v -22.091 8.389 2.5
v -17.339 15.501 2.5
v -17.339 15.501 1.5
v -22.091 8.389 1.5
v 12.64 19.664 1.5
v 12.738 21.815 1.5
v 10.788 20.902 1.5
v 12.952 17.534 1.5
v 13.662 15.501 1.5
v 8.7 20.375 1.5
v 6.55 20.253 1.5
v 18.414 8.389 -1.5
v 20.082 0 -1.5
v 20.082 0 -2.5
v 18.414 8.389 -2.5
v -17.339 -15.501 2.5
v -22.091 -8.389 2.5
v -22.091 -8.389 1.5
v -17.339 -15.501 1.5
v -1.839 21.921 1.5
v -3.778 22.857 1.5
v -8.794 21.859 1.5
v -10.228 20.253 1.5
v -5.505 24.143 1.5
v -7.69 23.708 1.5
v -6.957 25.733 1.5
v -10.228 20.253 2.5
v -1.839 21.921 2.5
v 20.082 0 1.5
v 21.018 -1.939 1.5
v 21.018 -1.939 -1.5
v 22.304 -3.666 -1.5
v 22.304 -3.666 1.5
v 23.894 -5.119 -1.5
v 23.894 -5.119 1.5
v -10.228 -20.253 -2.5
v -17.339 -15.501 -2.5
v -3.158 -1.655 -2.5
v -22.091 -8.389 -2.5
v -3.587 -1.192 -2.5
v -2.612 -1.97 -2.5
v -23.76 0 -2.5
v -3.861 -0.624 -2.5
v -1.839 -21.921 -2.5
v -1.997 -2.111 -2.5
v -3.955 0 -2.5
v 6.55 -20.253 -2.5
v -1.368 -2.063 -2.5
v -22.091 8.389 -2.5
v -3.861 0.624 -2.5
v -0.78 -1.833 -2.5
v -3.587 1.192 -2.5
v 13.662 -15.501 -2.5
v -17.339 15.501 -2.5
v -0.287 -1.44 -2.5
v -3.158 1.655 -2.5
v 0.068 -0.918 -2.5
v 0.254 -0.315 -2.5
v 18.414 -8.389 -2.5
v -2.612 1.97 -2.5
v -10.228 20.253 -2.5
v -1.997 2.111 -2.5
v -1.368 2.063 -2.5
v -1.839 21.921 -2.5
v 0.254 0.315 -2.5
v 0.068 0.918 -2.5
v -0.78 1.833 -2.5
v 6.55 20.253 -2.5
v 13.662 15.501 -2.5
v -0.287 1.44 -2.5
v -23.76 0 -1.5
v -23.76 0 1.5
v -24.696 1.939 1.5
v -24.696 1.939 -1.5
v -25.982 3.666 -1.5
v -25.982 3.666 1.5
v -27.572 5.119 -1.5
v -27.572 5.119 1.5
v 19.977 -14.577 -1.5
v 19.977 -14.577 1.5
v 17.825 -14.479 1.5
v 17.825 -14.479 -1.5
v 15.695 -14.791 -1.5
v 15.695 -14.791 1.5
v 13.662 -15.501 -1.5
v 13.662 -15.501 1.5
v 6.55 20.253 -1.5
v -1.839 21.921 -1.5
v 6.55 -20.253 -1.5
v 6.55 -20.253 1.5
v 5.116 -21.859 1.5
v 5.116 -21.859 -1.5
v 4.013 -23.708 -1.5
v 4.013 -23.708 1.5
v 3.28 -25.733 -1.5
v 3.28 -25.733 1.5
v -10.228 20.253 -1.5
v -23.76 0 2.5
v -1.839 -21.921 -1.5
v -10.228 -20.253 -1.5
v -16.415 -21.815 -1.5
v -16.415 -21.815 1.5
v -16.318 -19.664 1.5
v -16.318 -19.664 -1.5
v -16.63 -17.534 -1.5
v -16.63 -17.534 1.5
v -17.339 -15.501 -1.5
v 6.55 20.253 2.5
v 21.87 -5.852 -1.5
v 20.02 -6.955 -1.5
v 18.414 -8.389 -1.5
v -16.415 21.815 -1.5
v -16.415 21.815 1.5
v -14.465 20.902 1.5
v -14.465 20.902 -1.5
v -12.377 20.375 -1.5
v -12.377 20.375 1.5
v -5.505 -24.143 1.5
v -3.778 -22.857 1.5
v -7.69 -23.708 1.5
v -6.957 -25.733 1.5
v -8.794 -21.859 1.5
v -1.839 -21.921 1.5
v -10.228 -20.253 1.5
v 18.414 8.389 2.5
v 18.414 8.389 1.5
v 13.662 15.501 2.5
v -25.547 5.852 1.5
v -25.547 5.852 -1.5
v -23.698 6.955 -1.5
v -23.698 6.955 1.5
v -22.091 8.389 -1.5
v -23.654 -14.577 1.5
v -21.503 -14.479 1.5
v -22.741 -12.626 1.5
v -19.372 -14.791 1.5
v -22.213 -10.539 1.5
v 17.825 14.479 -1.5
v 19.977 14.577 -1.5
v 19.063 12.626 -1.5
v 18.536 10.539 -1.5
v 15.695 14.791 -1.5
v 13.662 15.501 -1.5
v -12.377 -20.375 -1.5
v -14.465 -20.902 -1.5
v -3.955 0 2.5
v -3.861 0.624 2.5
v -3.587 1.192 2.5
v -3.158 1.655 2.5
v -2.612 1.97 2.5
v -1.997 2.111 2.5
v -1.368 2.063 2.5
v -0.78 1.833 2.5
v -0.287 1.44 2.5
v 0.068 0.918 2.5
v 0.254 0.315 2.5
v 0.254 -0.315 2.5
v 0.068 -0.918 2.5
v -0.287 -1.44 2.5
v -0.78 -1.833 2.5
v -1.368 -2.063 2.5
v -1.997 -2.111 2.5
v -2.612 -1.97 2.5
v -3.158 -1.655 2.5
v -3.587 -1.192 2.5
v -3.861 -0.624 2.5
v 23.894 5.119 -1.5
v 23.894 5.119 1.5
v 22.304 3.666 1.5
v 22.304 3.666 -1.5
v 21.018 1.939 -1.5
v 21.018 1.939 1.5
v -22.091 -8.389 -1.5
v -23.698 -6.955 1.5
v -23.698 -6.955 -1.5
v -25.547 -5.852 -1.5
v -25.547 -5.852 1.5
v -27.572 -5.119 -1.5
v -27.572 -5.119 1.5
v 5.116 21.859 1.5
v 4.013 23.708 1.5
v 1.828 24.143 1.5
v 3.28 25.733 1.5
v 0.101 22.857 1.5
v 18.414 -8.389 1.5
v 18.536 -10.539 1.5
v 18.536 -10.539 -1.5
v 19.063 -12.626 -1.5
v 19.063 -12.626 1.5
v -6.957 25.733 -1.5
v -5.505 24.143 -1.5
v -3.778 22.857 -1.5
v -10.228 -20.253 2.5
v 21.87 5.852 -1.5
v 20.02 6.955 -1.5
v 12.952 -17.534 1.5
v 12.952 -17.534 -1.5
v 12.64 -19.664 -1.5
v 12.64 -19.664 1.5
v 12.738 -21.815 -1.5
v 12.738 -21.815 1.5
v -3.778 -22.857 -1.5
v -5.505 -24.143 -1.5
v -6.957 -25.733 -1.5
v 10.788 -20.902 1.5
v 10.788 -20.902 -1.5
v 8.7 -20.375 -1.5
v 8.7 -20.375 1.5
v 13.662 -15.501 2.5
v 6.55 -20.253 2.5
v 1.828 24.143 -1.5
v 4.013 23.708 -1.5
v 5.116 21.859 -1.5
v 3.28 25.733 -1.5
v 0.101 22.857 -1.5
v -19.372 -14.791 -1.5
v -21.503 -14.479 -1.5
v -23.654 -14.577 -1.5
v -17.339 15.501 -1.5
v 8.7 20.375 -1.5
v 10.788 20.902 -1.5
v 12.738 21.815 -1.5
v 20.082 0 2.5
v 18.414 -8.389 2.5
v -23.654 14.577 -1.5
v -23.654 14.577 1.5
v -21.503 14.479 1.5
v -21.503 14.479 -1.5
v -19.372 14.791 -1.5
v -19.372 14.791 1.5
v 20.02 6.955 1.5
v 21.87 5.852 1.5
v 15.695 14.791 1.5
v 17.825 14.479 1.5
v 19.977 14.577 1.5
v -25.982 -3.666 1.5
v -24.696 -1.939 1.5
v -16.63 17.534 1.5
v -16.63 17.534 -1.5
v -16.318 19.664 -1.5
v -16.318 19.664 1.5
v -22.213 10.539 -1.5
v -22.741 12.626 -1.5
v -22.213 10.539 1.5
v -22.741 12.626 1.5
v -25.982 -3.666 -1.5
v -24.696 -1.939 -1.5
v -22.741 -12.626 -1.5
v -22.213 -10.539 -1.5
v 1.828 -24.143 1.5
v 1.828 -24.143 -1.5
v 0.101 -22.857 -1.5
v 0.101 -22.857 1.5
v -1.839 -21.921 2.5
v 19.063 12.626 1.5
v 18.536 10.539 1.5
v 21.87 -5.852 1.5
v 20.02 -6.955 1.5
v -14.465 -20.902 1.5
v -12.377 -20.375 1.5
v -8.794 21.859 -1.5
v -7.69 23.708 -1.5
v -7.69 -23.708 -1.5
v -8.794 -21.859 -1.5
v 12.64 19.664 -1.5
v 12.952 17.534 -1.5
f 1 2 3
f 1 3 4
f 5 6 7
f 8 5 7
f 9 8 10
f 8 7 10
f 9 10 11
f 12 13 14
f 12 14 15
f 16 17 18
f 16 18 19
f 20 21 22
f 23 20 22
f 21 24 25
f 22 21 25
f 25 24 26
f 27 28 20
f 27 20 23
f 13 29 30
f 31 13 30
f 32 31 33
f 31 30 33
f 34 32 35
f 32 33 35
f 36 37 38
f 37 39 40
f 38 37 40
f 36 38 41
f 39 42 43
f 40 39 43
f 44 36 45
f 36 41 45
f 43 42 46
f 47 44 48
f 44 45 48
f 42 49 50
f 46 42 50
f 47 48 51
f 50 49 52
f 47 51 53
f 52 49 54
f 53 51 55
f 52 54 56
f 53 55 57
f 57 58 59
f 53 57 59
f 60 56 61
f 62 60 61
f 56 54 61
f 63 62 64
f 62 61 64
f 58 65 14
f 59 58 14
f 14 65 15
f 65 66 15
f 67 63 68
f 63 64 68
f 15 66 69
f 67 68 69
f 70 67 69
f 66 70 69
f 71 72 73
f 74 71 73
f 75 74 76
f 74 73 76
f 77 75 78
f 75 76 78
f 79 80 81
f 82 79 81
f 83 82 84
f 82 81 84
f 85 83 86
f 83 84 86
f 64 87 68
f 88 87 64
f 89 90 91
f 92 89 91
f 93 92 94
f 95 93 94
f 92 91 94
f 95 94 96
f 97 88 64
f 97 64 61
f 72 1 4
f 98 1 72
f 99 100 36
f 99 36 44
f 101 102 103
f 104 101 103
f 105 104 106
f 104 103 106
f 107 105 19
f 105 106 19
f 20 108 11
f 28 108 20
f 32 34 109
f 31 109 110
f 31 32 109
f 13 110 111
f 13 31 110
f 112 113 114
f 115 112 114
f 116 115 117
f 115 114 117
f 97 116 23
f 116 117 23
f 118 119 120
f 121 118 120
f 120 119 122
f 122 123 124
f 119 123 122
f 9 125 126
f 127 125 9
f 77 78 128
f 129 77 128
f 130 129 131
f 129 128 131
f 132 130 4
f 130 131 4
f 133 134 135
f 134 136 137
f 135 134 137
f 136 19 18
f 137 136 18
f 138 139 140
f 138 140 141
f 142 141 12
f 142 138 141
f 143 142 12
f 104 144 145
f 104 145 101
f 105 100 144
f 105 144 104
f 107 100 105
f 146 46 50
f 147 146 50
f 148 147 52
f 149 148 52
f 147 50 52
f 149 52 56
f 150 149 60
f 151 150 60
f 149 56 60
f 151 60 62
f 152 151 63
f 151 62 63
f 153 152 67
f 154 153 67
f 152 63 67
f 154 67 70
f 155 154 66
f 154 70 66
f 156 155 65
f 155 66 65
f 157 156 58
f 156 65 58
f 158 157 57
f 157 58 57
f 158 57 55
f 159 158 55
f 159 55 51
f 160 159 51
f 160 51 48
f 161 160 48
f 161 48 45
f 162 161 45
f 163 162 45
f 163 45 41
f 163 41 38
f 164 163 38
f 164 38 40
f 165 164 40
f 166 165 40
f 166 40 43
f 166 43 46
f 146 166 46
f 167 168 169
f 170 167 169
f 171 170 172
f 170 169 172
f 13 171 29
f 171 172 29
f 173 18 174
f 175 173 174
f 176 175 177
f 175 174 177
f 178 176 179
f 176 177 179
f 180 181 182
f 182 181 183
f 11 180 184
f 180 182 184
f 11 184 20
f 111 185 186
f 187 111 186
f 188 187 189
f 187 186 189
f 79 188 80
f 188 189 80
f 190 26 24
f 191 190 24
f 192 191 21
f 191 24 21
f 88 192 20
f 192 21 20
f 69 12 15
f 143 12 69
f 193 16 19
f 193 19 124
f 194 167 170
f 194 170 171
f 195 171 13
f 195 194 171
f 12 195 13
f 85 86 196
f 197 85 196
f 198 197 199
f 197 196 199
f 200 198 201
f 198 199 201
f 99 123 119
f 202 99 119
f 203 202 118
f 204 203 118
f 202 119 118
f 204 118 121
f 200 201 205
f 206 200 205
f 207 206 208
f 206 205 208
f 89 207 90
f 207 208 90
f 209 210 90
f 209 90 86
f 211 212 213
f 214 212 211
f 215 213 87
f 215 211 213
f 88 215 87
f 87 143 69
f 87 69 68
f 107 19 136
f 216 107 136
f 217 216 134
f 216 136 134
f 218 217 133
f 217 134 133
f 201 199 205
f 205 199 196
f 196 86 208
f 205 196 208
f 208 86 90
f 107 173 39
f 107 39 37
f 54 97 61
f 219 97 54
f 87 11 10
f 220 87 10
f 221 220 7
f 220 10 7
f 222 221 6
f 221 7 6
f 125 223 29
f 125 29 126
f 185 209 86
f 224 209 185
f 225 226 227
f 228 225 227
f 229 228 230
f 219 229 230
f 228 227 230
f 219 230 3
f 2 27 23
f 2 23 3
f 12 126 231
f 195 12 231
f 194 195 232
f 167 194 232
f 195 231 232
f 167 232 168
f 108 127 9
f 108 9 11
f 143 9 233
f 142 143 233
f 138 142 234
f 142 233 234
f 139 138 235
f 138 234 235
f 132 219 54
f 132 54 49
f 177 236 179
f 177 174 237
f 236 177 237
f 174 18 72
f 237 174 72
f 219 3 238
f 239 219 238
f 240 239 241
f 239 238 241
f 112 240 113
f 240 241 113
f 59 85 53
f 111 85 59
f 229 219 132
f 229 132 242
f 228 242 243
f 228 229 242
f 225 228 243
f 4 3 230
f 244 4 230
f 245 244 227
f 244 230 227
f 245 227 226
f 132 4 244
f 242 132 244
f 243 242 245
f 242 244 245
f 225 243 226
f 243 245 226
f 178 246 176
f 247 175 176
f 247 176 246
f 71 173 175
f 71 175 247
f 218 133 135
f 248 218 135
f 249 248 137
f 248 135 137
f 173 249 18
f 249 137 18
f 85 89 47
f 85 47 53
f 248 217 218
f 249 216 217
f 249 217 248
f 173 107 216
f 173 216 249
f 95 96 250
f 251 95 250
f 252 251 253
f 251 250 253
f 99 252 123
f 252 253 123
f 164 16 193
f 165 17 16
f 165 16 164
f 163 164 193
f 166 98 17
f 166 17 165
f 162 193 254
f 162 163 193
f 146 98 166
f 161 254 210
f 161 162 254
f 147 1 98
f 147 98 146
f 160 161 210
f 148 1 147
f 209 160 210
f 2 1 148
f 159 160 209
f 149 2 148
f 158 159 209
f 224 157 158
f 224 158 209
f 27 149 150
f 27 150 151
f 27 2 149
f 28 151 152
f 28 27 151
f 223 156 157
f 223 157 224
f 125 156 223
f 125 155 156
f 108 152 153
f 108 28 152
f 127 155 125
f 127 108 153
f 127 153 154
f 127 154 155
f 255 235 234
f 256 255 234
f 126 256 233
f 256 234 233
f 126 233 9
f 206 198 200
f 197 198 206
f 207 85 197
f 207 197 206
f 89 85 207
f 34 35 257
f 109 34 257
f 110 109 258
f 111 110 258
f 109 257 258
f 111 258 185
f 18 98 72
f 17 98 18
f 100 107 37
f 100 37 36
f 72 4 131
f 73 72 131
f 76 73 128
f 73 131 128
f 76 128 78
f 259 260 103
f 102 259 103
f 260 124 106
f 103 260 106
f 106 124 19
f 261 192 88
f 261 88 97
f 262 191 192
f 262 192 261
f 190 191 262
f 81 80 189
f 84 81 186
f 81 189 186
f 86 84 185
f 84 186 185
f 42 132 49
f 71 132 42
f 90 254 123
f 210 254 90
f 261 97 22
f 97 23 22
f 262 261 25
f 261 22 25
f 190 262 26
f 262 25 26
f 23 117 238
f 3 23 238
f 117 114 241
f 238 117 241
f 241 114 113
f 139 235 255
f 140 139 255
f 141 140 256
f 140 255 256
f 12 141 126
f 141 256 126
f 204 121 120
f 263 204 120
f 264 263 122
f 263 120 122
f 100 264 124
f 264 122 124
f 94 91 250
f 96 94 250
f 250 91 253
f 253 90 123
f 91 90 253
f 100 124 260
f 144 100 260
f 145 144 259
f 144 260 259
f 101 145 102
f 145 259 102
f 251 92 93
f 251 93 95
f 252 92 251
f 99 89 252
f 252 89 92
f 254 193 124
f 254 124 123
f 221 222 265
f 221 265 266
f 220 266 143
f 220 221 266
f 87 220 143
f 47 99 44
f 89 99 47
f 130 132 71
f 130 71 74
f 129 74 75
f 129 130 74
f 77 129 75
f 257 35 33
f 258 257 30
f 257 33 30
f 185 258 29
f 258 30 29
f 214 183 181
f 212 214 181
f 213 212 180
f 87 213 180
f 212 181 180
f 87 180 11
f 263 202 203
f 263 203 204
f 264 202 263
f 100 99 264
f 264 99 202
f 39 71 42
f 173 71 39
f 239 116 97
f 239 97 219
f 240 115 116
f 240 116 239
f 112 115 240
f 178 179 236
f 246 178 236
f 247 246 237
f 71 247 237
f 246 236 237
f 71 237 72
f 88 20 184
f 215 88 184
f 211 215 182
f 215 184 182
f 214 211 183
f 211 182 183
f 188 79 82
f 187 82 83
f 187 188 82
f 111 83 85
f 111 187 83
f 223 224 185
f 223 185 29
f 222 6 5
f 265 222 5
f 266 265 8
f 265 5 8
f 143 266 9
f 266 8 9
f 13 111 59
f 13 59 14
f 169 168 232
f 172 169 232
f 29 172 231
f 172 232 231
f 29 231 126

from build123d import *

# Parameters (mm, degrees)
Y_KSEKLIK_EKSTR_ZYON1_DEPTH = 2.5
IZIM3_R                     = 2.116464506
KES_EKSTR_ZYON2_DEPTH       = 31
Y_KSEKLIK_EKSTR_ZYON3_DEPTH = 1.5


with BuildPart() as part:
    # Çizim1 → Yükseklik-Ekstrüzyon1 (new body, symmetric)
    with BuildSketch(Plane.XY):
        Polygon((20.082496858, 0), (18.413844112, 8.388883847), (13.661923129, 15.500636173), (6.550170803, 20.252557156), (-1.838713044, 21.921209901), (-10.22759689, 20.252557156), (-17.339349217, 15.500636173), (-22.0912702, 8.388883847), (-23.759922945, 0), (-22.0912702, -8.388883847), (-17.339349217, -15.500636173), (-10.22759689, -20.252557156), (-1.838713044, -21.921209901), (6.550170803, -20.252557156), (13.661923129, -15.500636173), (18.413844112, -8.388883847), align=None)
    extrude(amount=Y_KSEKLIK_EKSTR_ZYON1_DEPTH, both=True)

    # Çizim3 → Kes-Ekstrüzyon2 (cut)
    with BuildSketch(Plane(origin=(0, 0, -2.5), x_dir=(-1, 0, 0), z_dir=(0, 0, -1))):
        with Locations((1.838713044, 0)):
            Circle(IZIM3_R)
    extrude(amount=-KES_EKSTR_ZYON2_DEPTH, mode=Mode.SUBTRACT)

    # Çizim6 → Yükseklik-Ekstrüzyon3 (add, symmetric)
    with BuildSketch(Plane.XY):
        with BuildLine():
            ThreePointArc((-6.957303461, 25.732891749), (-4.672314924, 23.458692825), (-1.838713044, 21.921209901))
            Line((-1.838713044, 21.921209901), (-10.22759689, 20.252557156))
            ThreePointArc((-10.22759689, 20.252557156), (-8.198059352, 22.757378654), (-6.957303461, 25.732891749))
        make_face()
        with BuildLine():
            ThreePointArc((3.279877374, 25.732891749), (4.520633265, 22.757378654), (6.550170803, 20.252557156))
            Line((6.550170803, 20.252557156), (-1.838713044, 21.921209901))
            ThreePointArc((-1.838713044, 21.921209901), (0.994888837, 23.458692825), (3.279877374, 25.732891749))
        make_face()
        with BuildLine():
            ThreePointArc((12.737799217, 21.815292249), (12.745428626, 18.591459879), (13.661923129, 15.500636173))
            Line((13.661923129, 15.500636173), (6.550170803, 20.252557156))
            ThreePointArc((6.550170803, 20.252557156), (9.756446826, 20.588633667), (12.737799217, 21.815292249))
        make_face()
        with BuildLine():
            ThreePointArc((19.976579206, 14.576512261), (18.749920623, 11.59515987), (18.413844112, 8.388883847))
            Line((18.413844112, 8.388883847), (13.661923129, 15.500636173))
            ThreePointArc((13.661923129, 15.500636173), (16.752746836, 14.584141669), (19.976579206, 14.576512261))
        make_face()
        with BuildLine():
            ThreePointArc((23.894178705, 5.118590417), (21.619979781, 2.833601881), (20.082496858, 0))
            Line((20.082496858, 0), (18.413844112, 8.388883847))
            ThreePointArc((18.413844112, 8.388883847), (20.91866561, 6.359346308), (23.894178705, 5.118590417))
        make_face()
        with BuildLine():
            ThreePointArc((23.894178705, -5.118590417), (20.91866561, -6.359346308), (18.413844112, -8.388883847))
            Line((18.413844112, -8.388883847), (20.082496858, 0))
            ThreePointArc((20.082496858, 0), (21.619979781, -2.833601881), (23.894178705, -5.118590417))
        make_face()
        with BuildLine():
            ThreePointArc((19.976579206, -14.576512261), (16.752746836, -14.584141669), (13.661923129, -15.500636173))
            Line((13.661923129, -15.500636173), (18.413844112, -8.388883847))
            ThreePointArc((18.413844112, -8.388883847), (18.749920623, -11.59515987), (19.976579206, -14.576512261))
        make_face()
        with BuildLine():
            ThreePointArc((12.737799217, -21.815292249), (9.756446826, -20.588633667), (6.550170803, -20.252557156))
            Line((6.550170803, -20.252557156), (13.661923129, -15.500636173))
            ThreePointArc((13.661923129, -15.500636173), (12.745428626, -18.591459879), (12.737799217, -21.815292249))
        make_face()
        with BuildLine():
            ThreePointArc((3.279877374, -25.732891749), (0.994888837, -23.458692825), (-1.838713044, -21.921209901))
            Line((-1.838713044, -21.921209901), (6.550170803, -20.252557156))
            ThreePointArc((6.550170803, -20.252557156), (4.520633265, -22.757378654), (3.279877374, -25.732891749))
        make_face()
        with BuildLine():
            ThreePointArc((-6.957303461, -25.732891749), (-8.198059352, -22.757378654), (-10.22759689, -20.252557156))
            Line((-10.22759689, -20.252557156), (-1.838713044, -21.921209901))
            ThreePointArc((-1.838713044, -21.921209901), (-4.672314924, -23.458692825), (-6.957303461, -25.732891749))
        make_face()
        with BuildLine():
            ThreePointArc((-16.415225305, -21.815292249), (-16.422854713, -18.591459879), (-17.339349217, -15.500636173))
            Line((-17.339349217, -15.500636173), (-10.22759689, -20.252557156))
            ThreePointArc((-10.22759689, -20.252557156), (-13.433872913, -20.588633667), (-16.415225305, -21.815292249))
        make_face()
        with BuildLine():
            ThreePointArc((-23.654005293, -14.576512261), (-22.427346711, -11.59515987), (-22.0912702, -8.388883847))
            Line((-22.0912702, -8.388883847), (-17.339349217, -15.500636173))
            ThreePointArc((-17.339349217, -15.500636173), (-20.430172923, -14.584141669), (-23.654005293, -14.576512261))
        make_face()
        with BuildLine():
            ThreePointArc((-27.571604792, -5.118590417), (-25.297405869, -2.833601881), (-23.759922945, 0))
            Line((-23.759922945, 0), (-22.0912702, -8.388883847))
            ThreePointArc((-22.0912702, -8.388883847), (-24.596091698, -6.359346308), (-27.571604792, -5.118590417))
        make_face()
        with BuildLine():
            ThreePointArc((-27.571604793, 5.118590417), (-24.596091698, 6.359346308), (-22.0912702, 8.388883847))
            Line((-22.0912702, 8.388883847), (-23.759922945, 0))
            ThreePointArc((-23.759922945, 0), (-25.297405869, 2.833601881), (-27.571604793, 5.118590417))
        make_face()
        with BuildLine():
            ThreePointArc((-23.654005293, 14.576512261), (-20.430172923, 14.584141669), (-17.339349217, 15.500636173))
            Line((-17.339349217, 15.500636173), (-22.0912702, 8.388883847))
            ThreePointArc((-22.0912702, 8.388883847), (-22.427346711, 11.59515987), (-23.654005293, 14.576512261))
        make_face()
        with BuildLine():
            ThreePointArc((-16.415225305, 21.815292249), (-13.433872913, 20.588633667), (-10.22759689, 20.252557156))
            Line((-10.22759689, 20.252557156), (-17.339349217, 15.500636173))
            ThreePointArc((-17.339349217, 15.500636173), (-16.422854713, 18.591459879), (-16.415225305, 21.815292249))
        make_face()
    extrude(amount=Y_KSEKLIK_EKSTR_ZYON3_DEPTH, both=True)


solid = part.part
